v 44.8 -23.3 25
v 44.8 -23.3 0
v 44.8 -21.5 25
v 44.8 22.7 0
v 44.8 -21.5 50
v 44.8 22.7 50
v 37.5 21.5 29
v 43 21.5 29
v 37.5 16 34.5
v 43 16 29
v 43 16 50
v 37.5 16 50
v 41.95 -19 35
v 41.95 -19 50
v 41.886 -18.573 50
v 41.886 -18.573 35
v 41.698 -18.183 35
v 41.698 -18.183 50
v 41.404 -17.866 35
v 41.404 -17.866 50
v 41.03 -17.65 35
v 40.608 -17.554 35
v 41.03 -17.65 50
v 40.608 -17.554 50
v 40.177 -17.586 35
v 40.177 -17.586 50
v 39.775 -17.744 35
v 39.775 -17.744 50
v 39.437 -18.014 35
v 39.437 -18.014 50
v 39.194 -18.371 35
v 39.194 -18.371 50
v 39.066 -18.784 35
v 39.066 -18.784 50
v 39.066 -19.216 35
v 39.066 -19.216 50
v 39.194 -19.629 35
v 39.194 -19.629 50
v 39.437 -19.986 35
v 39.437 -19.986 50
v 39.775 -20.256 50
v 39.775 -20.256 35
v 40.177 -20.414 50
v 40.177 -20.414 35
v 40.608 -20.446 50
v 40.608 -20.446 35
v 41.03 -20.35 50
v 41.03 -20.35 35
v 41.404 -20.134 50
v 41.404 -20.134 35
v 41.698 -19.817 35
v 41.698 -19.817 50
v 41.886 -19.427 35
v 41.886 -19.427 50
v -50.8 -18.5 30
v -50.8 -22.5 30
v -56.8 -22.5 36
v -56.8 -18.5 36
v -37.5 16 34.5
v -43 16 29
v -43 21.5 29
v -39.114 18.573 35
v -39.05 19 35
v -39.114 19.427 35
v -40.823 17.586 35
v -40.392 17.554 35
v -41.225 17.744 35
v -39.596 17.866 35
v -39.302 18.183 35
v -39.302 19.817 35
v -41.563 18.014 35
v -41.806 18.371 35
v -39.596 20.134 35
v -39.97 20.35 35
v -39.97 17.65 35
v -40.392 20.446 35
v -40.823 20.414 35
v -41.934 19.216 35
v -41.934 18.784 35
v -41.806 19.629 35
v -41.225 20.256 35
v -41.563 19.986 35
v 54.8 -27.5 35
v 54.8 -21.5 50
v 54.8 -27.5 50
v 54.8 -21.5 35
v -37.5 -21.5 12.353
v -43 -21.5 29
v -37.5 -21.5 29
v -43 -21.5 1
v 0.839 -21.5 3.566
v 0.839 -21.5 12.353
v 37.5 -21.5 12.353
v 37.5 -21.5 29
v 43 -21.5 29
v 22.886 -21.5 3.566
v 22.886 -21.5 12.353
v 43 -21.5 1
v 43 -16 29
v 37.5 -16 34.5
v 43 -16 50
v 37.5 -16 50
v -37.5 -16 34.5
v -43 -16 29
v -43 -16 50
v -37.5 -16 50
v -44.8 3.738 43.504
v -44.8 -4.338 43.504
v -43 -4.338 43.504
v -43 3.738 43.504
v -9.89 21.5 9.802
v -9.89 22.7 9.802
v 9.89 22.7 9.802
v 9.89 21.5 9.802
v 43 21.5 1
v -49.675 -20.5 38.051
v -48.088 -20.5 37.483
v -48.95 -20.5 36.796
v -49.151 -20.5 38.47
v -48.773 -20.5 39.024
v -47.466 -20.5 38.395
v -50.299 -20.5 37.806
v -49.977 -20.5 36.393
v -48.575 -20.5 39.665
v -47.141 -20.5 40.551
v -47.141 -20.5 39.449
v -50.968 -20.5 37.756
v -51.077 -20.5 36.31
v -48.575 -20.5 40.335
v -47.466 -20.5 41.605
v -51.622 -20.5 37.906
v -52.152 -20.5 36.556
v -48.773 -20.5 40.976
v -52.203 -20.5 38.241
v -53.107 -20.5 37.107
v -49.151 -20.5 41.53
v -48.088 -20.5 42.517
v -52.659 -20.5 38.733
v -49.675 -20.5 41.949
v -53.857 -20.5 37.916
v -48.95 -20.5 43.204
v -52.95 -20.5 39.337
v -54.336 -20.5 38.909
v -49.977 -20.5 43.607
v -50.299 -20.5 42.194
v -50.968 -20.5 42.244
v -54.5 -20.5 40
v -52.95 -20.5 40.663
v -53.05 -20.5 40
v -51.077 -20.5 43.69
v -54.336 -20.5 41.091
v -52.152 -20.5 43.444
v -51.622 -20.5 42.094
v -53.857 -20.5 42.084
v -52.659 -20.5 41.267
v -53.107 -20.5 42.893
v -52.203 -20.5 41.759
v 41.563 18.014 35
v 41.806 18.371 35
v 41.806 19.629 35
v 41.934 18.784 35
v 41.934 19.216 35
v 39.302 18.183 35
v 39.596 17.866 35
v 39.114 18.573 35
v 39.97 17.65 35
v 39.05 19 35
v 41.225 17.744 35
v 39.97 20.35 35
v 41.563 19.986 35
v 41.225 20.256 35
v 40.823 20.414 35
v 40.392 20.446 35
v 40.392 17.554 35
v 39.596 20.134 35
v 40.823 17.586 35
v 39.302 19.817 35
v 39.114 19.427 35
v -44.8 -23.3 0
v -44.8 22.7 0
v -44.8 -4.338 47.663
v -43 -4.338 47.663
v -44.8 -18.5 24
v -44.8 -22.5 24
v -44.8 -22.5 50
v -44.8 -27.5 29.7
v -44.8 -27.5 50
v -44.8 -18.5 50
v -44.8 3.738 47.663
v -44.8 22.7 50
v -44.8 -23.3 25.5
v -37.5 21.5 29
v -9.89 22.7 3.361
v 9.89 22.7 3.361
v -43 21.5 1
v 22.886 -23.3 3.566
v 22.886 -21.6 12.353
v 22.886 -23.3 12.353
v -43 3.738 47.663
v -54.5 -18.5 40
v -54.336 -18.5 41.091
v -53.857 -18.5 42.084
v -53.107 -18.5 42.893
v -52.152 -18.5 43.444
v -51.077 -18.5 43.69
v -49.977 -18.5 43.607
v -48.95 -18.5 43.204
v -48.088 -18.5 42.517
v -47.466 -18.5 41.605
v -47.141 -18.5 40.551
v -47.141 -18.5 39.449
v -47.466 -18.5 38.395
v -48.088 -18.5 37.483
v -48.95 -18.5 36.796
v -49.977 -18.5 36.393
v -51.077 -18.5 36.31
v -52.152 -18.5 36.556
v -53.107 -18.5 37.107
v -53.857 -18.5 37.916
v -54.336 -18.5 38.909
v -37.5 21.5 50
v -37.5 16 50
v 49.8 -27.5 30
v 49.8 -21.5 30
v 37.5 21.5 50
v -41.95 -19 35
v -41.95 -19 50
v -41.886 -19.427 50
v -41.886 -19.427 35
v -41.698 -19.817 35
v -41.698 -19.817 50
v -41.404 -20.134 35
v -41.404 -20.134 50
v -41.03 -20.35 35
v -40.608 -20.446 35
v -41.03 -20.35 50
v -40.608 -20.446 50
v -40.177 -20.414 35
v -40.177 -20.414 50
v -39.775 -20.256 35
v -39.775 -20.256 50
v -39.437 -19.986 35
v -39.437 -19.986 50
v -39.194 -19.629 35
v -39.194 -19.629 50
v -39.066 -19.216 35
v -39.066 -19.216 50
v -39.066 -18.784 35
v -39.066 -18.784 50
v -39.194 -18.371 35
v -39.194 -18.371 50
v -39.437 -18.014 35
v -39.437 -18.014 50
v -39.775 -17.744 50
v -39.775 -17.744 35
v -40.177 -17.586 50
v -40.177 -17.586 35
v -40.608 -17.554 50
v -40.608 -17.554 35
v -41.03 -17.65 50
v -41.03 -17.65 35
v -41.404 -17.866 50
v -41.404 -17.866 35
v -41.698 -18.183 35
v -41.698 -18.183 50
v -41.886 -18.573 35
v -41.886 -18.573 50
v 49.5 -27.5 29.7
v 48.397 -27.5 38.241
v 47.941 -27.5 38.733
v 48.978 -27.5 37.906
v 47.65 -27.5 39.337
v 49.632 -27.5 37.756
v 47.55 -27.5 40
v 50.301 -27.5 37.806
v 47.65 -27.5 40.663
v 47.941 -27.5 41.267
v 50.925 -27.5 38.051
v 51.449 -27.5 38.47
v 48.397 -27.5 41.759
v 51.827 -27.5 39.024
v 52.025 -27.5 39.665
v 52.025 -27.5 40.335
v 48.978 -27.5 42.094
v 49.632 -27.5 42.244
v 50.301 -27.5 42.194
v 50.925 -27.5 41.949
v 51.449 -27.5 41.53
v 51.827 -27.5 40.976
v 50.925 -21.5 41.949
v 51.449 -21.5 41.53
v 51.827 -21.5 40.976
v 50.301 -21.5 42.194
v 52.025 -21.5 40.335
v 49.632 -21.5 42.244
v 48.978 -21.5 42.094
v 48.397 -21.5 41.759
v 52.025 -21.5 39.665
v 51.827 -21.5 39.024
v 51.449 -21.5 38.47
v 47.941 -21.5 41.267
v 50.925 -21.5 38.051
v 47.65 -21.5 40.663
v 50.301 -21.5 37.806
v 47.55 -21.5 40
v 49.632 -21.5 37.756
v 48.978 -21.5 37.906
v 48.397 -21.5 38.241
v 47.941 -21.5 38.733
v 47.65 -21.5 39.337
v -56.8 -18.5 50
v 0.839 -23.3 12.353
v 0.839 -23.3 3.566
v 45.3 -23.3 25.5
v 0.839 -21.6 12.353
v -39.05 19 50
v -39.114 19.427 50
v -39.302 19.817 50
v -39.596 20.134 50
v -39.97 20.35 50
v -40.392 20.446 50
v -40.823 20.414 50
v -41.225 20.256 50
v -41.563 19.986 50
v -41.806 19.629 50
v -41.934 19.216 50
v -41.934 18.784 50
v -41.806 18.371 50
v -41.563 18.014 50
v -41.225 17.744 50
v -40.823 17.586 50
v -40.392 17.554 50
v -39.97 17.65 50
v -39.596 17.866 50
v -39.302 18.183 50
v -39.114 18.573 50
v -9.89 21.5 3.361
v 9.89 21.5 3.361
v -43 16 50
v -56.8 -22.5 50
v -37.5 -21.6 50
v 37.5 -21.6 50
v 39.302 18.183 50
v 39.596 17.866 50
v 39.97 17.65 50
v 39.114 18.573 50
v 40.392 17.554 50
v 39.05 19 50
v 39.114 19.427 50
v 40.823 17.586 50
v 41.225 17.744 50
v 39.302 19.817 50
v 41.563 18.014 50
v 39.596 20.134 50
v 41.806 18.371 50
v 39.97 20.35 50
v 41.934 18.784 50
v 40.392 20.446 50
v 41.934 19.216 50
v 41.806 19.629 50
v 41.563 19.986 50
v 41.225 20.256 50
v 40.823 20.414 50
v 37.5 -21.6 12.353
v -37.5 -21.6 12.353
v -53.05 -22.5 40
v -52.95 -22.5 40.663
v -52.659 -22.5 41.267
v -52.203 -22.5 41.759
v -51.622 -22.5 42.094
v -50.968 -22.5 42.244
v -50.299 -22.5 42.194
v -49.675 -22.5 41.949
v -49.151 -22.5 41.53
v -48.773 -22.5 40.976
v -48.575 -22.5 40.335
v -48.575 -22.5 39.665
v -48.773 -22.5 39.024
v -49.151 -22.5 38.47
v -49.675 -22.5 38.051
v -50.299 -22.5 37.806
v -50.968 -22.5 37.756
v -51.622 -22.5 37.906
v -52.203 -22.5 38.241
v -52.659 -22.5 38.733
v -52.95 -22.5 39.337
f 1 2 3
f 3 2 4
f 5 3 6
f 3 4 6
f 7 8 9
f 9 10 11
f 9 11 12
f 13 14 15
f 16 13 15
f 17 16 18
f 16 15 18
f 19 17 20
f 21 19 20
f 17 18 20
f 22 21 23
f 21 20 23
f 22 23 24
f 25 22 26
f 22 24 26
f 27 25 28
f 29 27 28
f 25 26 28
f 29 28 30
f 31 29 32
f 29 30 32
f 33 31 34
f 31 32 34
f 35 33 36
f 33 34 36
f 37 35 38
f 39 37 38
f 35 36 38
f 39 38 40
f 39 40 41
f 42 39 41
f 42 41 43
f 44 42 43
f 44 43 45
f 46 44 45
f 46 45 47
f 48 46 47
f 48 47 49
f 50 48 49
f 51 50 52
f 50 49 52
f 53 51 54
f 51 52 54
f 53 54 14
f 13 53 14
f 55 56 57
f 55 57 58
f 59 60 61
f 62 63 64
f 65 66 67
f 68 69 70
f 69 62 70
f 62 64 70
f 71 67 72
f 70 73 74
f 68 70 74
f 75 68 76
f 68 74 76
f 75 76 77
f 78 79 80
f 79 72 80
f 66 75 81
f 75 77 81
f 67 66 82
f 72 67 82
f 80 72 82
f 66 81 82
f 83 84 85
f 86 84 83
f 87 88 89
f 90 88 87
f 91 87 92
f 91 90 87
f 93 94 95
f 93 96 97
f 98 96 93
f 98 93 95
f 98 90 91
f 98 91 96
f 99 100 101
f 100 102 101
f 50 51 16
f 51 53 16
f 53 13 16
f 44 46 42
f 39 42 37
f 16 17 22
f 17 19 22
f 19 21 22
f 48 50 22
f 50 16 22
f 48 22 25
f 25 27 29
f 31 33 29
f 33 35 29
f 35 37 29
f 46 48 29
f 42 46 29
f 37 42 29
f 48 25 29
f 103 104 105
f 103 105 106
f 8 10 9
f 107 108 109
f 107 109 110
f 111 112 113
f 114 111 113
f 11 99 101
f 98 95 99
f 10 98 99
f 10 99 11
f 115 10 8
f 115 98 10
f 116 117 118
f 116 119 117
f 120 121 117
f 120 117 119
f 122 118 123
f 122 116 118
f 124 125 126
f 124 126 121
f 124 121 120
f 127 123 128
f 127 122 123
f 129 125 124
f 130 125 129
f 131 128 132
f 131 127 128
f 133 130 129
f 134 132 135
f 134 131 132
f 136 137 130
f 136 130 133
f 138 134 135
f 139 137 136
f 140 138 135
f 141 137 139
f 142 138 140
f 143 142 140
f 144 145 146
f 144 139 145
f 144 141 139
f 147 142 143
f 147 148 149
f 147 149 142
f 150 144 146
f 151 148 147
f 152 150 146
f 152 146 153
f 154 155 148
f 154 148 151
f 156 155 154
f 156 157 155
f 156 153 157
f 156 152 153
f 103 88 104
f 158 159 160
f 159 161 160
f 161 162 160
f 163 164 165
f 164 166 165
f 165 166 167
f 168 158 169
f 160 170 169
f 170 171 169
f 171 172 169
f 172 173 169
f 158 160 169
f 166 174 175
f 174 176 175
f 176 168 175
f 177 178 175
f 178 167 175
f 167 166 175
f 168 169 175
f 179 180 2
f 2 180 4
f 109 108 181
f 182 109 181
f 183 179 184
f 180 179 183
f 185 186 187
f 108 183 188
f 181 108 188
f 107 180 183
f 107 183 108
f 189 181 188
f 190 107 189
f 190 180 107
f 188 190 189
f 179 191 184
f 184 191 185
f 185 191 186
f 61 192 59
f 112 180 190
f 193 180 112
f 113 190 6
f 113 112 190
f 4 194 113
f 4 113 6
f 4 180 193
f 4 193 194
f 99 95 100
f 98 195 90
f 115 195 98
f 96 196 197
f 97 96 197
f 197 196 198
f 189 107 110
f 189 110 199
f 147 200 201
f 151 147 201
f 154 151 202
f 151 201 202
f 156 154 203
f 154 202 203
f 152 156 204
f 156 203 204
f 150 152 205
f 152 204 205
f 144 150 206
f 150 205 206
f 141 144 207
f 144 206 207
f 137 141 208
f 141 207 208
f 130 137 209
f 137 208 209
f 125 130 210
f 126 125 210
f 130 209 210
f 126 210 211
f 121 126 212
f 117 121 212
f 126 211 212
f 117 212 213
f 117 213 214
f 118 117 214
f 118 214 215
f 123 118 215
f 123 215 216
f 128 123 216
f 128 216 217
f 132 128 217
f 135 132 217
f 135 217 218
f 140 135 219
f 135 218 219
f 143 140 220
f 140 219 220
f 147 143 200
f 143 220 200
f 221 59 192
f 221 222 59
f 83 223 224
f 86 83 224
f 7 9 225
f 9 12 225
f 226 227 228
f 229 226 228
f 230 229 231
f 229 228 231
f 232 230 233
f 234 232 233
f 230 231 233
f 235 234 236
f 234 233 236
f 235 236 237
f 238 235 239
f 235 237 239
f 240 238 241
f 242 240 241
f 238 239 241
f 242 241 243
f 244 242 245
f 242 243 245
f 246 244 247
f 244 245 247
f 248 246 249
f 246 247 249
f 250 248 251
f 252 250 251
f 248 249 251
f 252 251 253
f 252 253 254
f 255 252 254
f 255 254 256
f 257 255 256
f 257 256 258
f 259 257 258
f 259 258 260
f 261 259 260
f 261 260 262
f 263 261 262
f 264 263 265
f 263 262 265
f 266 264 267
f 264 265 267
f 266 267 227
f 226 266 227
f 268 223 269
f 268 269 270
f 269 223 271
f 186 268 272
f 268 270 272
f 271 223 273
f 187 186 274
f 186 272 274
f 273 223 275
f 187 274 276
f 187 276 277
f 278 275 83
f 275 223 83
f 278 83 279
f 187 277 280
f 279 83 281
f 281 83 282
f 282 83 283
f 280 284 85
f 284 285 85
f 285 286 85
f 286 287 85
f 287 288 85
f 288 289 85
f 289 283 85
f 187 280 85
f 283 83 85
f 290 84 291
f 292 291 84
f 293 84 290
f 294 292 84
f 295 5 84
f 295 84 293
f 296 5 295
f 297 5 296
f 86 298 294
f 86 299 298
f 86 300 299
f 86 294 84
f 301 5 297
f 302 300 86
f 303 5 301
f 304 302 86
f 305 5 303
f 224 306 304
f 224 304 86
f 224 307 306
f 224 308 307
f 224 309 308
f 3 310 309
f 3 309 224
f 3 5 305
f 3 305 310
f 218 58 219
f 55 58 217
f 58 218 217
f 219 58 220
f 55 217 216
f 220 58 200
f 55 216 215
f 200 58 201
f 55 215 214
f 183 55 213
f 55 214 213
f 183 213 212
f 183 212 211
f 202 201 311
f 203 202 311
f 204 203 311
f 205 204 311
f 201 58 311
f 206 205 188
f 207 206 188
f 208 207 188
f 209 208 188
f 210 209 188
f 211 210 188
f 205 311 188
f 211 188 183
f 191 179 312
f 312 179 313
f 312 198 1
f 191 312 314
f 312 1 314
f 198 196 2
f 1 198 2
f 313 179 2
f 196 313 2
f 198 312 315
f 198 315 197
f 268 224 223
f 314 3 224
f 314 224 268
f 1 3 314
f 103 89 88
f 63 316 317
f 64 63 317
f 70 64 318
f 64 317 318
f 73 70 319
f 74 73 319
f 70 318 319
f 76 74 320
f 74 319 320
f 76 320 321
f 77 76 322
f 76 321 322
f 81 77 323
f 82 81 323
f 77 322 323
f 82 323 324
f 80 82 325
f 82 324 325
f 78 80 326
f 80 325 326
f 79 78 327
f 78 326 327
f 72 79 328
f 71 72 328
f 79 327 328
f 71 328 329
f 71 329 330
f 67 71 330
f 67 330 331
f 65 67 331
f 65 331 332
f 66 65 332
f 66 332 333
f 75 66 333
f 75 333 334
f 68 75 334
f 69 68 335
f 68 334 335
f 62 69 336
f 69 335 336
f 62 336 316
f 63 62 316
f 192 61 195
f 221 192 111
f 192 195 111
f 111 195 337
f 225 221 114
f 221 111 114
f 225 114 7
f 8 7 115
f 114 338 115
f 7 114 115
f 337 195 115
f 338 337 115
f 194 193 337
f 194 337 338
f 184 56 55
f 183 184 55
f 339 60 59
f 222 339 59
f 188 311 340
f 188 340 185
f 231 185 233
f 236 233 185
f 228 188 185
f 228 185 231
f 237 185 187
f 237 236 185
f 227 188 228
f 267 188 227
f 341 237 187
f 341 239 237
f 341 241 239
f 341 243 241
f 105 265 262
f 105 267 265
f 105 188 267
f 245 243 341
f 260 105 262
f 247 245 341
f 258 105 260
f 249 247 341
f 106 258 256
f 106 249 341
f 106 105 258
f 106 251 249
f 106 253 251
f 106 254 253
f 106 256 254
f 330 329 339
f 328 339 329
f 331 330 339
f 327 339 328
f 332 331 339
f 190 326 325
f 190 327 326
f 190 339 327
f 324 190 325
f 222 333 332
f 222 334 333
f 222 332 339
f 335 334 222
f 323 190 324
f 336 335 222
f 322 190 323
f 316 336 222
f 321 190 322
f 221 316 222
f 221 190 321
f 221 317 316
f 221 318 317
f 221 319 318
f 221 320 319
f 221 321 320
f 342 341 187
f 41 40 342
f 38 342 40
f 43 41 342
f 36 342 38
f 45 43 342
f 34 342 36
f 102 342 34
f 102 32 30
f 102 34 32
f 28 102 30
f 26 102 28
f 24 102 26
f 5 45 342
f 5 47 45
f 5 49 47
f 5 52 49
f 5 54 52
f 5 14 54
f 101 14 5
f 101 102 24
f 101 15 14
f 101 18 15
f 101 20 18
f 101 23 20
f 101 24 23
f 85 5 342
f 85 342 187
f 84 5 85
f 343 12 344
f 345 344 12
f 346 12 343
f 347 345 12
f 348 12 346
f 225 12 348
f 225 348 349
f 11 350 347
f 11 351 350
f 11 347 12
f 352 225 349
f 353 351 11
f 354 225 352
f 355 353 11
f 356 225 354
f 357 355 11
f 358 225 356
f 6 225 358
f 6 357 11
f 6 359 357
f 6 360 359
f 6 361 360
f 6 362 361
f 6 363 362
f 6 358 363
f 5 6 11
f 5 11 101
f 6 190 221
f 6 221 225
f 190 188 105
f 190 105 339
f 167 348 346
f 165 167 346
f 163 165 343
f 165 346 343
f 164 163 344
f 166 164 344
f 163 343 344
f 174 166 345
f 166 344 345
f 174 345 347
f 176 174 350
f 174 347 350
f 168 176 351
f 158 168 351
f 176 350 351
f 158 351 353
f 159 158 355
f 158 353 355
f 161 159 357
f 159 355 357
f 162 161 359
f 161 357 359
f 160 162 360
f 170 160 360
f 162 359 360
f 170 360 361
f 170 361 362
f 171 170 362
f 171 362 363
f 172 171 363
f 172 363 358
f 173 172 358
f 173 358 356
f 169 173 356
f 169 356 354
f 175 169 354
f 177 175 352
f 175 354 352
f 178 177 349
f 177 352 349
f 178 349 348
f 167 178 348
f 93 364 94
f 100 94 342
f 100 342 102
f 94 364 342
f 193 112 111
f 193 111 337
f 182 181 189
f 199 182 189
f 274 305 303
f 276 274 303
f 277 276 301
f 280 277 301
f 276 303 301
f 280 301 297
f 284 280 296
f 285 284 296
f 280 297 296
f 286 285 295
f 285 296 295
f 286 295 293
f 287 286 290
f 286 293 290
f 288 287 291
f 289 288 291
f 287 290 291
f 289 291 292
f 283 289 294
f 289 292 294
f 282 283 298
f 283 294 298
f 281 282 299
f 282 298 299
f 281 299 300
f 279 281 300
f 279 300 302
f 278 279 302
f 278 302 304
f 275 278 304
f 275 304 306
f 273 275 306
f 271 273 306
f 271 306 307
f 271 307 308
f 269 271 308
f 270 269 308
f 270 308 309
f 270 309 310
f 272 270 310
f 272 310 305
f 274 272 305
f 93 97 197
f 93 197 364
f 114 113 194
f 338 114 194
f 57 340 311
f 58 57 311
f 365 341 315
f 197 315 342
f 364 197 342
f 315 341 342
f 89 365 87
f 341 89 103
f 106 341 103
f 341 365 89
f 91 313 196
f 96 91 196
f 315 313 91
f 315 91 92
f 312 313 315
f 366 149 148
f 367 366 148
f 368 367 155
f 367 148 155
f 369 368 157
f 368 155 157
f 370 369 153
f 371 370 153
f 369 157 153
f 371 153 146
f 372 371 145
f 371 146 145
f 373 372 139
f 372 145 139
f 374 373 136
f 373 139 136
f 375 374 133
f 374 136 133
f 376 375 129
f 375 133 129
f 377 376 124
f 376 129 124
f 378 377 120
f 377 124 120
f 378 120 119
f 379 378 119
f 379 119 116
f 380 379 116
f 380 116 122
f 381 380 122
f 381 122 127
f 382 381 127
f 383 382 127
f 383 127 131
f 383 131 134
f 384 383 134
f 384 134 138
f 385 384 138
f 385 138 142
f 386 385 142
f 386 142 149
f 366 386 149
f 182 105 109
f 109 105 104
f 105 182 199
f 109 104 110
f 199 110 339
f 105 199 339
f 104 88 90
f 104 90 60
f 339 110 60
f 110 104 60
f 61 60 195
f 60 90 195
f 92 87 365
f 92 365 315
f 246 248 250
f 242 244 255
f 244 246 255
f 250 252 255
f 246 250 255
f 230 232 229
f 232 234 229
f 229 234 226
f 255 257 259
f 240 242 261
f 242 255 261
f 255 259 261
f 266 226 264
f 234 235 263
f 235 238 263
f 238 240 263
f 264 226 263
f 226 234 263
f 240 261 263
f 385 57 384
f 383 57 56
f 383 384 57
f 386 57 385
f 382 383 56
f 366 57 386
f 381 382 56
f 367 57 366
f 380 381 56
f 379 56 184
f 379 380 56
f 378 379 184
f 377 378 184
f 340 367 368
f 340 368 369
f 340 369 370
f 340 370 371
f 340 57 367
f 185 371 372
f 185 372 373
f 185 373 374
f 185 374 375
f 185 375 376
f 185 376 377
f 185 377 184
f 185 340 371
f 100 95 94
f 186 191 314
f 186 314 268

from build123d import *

# Parameters (mm, degrees)
SKIZZE1_W                       = 89.6
SKIZZE1_H                       = 46
SKIZZE1_W_2                     = 86
SKIZZE1_H_2                     = 43
AUFSATZ_LINEAR_AUSTRAGEN1_DEPTH = 1
SKIZZE1_3_W                     = 89.6
SKIZZE1_3_H                     = 46
SKIZZE1_3_W_2                   = 86
SKIZZE1_3_H_2                   = 43
AUFSATZ_LINEAR_AUSTRAGEN2_DEPTH = 50
SKIZZE2_W                       = 5.5
SKIZZE2_H                       = 5.5
SKIZZE2_R                       = 1.45
AUFSATZ_LINEAR_AUSTRAGEN3_DEPTH = 15
SKIZZE3_W                       = 5.5
SKIZZE3_H                       = 5.5
AUFSATZ_LINEAR_AUSTRAGEN4_DEPTH = 0.5
FASE1_SIZE                      = 5.5
SKIZZE4_W                       = 4.158916141
SKIZZE4_H                       = 8.076735696
SCHNITT_LINEAR_AUSTRAGEN1_DEPTH = 10
SKIZZE5_W                       = 22.047742135
SKIZZE5_H                       = 8.787632461
SCHNITT_LINEAR_AUSTRAGEN2_DEPTH = 10
SKIZZE6_W                       = 19.779455906
SKIZZE6_H                       = 6.441932887
SCHNITT_LINEAR_AUSTRAGEN3_DEPTH = 10
SKIZZE9_W                       = 20
SKIZZE9_H                       = 6
AUFSATZ_LINEAR_AUSTRAGEN6_DEPTH = 10
SKIZZE10_R                      = 2.25
SCHNITT_LINEAR_AUSTRAGEN5_DEPTH = 10
SKIZZE11_W                      = 75
SKIZZE11_H                      = 0.1
SCHNITT_LINEAR_AUSTRAGEN6_DEPTH = 37.646803
SKIZZE12_W                      = 12
SKIZZE12_H                      = 4
AUFSATZ_LINEAR_AUSTRAGEN7_DEPTH = 20
SCHNITT_LINEAR_AUSTRAGEN7_REACH = 88.161
SKIZZE13_R                      = 2.25
SKIZZE14_R                      = 3.7
SCHNITT_LINEAR_AUSTRAGEN8_DEPTH = 2
SKIZZE15_W                      = 89.6
SKIZZE15_H                      = 4.2
AUFSATZ_LINEAR_AUSTRAGEN8_DEPTH = 20
FASE2_SIZE                      = 4.5
FASE3_SIZE                      = 5
FASE4_SIZE                      = 5
FASE5_SIZE                      = 6


# Some blends are built 0.0001 mm under size
with BuildPart() as part:
    # Skizze1 → Aufsatz-Linear austragen1 (new body)
    # profile 1 of 2: a face of its own
    with BuildSketch(Plane.XY):
        with Locations((0, -0.3)):
            Rectangle(SKIZZE1_W, SKIZZE1_H)
        Rectangle(SKIZZE1_W_2, SKIZZE1_H_2, mode=Mode.SUBTRACT)
    # profile 2 of 2: a face of its own
    with BuildSketch(Plane.XY):
        Rectangle(SKIZZE1_W_2, SKIZZE1_H_2)
    extrude(amount=AUFSATZ_LINEAR_AUSTRAGEN1_DEPTH)

    # Skizze1<3> → Aufsatz-Linear austragen2 (add)
    with BuildSketch(Plane.XY):
        with Locations((0, -0.3)):
            Rectangle(SKIZZE1_3_W, SKIZZE1_3_H)
        Rectangle(SKIZZE1_3_W_2, SKIZZE1_3_H_2, mode=Mode.SUBTRACT)
    extrude(amount=AUFSATZ_LINEAR_AUSTRAGEN2_DEPTH)

    # Skizze2 → Aufsatz-Linear austragen3 (add)
    # profile 1 of 4: a face of its own
    with BuildSketch(Plane.XY.offset(50)):
        with Locations((-40.25, 18.75)):
            Rectangle(SKIZZE2_W, SKIZZE2_H)
        with Locations((-40.5, 19)):
            Circle(SKIZZE2_R, mode=Mode.SUBTRACT)
    # profile 2 of 4: a face of its own
    with BuildSketch(Plane.XY.offset(50)):
        with Locations((-40.25, -18.75)):
            Rectangle(SKIZZE2_W, SKIZZE2_H)
        with Locations(Location((-40.5, -19, 0), (0, 0, 180))):
            Circle(SKIZZE2_R, mode=Mode.SUBTRACT)
    # profile 3 of 4: a face of its own
    with BuildSketch(Plane.XY.offset(50)):
        with Locations((40.25, -18.75)):
            Rectangle(SKIZZE2_W, SKIZZE2_H)
        with Locations((40.5, -19)):
            Circle(SKIZZE2_R, mode=Mode.SUBTRACT)
    # profile 4 of 4: a face of its own
    with BuildSketch(Plane.XY.offset(50)):
        with Locations((40.25, 18.75)):
            Rectangle(SKIZZE2_W, SKIZZE2_H)
        with Locations(Location((40.5, 19, 0), (0, 0, 180))):
            Circle(SKIZZE2_R, mode=Mode.SUBTRACT)
    extrude(amount=-AUFSATZ_LINEAR_AUSTRAGEN3_DEPTH)

    # Skizze3 → Aufsatz-Linear austragen4 (add)
    with BuildSketch(Plane(origin=(0, 0, 35), x_dir=(-1, 0, 0), z_dir=(0, 0, -1))):
        with Locations((-40.25, 18.75)):
            Rectangle(SKIZZE3_W, SKIZZE3_H)
        with Locations((-40.25, -18.75)):
            Rectangle(SKIZZE3_W, SKIZZE3_H)
        with Locations((40.25, -18.75)):
            Rectangle(SKIZZE3_W, SKIZZE3_H)
        with Locations((40.25, 18.75)):
            Rectangle(SKIZZE3_W, SKIZZE3_H)
    extrude(amount=AUFSATZ_LINEAR_AUSTRAGEN4_DEPTH)

    # Fase1
    fase1_edges = [part.edges().sort_by_distance(p)[0] for p in [
        (43, 18.75, 34.5),
        (40.25, 21.5, 34.5),
        (-40.25, -21.5, 34.5),
        (-43, -18.75, 34.5),
        (-43, 18.75, 34.5),
        (-40.25, 21.5, 34.5),
        (40.25, -21.5, 34.5),
        (43, -18.75, 34.5),
    ]]
    chamfer(fase1_edges, length=FASE1_SIZE - 0.0001)  # a hair under: the kernel refuses the full size

    # Skizze4 → Schnitt-Linear austragen1 (cut)
    with BuildSketch(Plane.ZY.offset(44.8)):
        with Locations((45.583621194, -0.3)):
            Rectangle(SKIZZE4_W, SKIZZE4_H)
    extrude(amount=-SCHNITT_LINEAR_AUSTRAGEN1_DEPTH, mode=Mode.SUBTRACT)

    # Skizze5 → Schnitt-Linear austragen2 (cut)
    with BuildSketch(Plane.XZ.offset(23.3)):
        with Locations((11.862553209, 7.95938084)):
            Rectangle(SKIZZE5_W, SKIZZE5_H)
    extrude(amount=-SCHNITT_LINEAR_AUSTRAGEN2_DEPTH, mode=Mode.SUBTRACT)

    # Skizze6 → Schnitt-Linear austragen3 (cut)
    with BuildSketch(Plane(origin=(0, 22.7, 0), x_dir=(1, 0, 0), z_dir=(0, 1, 0))):
        with Locations((0, -6.581515831)):
            Rectangle(SKIZZE6_W, SKIZZE6_H)
    extrude(amount=-SCHNITT_LINEAR_AUSTRAGEN3_DEPTH, mode=Mode.SUBTRACT)

    # Skizze9 → Aufsatz-Linear austragen6 (add)
    with BuildSketch(Plane(origin=(44.8, 0, 0), x_dir=(0, 0, -1), z_dir=(1, 0, 0))):
        with Locations((-40, -24.5)):
            Rectangle(SKIZZE9_W, SKIZZE9_H)
    extrude(amount=AUFSATZ_LINEAR_AUSTRAGEN6_DEPTH)

    # Skizze10 → Schnitt-Linear austragen5 (cut)
    with BuildSketch(Plane(origin=(0, -21.5, 0), x_dir=(1, 0, 0), z_dir=(0, 1, 0))):
        with Locations(Location((49.8, -40, 0), (0, 0, 180))):
            Circle(SKIZZE10_R)
        with Locations((-49.8, -40)):
            Circle(SKIZZE10_R)
    extrude(amount=-SCHNITT_LINEAR_AUSTRAGEN5_DEPTH, mode=Mode.SUBTRACT)

    # Skizze11 → Schnitt-Linear austragen6 (cut)
    with BuildSketch(Plane.XY.offset(50)):
        with Locations((0, -21.55)):
            Rectangle(SKIZZE11_W, SKIZZE11_H)
    extrude(amount=-SCHNITT_LINEAR_AUSTRAGEN6_DEPTH, mode=Mode.SUBTRACT)

    # Skizze12 → Aufsatz-Linear austragen7 (add)
    with BuildSketch(Plane.XY.offset(50)):
        with Locations((-50.8, -20.500000001)):
            Rectangle(SKIZZE12_W, SKIZZE12_H)
    extrude(amount=-AUFSATZ_LINEAR_AUSTRAGEN7_DEPTH)

    # Skizze13 → Schnitt-Linear austragen7 (cut, up to next)
    with BuildSketch(Plane(origin=(0, -18.500000001, 0), x_dir=(1, 0, 0), z_dir=(0, 1, 0)), mode=Mode.PRIVATE) as schnitt_linear_austragen7_sk1:
        with Locations(Location((-50.8, -40, 0), (0, 0, 180))):
            Circle(SKIZZE13_R)
    schnitt_linear_austragen7_tool1 = extrude(schnitt_linear_austragen7_sk1.sketch, amount=-SCHNITT_LINEAR_AUSTRAGEN7_REACH, mode=Mode.PRIVATE) & part.part
    add(schnitt_linear_austragen7_tool1.solids().sort_by_distance((-50.8, -18.5, 40))[0], mode=Mode.SUBTRACT)

    # Skizze14 → Schnitt-Linear austragen8 (cut)
    with BuildSketch(Plane(origin=(0, -18.500000001, 0), x_dir=(1, 0, 0), z_dir=(0, 1, 0))):
        with Locations(Location((-50.8, -40, 0), (0, 0, 180))):
            Circle(SKIZZE14_R)
    extrude(amount=-SCHNITT_LINEAR_AUSTRAGEN8_DEPTH, mode=Mode.SUBTRACT)

    # Skizze15 → Aufsatz-Linear austragen8 (add)
    with BuildSketch(Plane.XY.offset(50)):
        with Locations((0, -25.4)):
            Rectangle(SKIZZE15_W, SKIZZE15_H)
    extrude(amount=-AUFSATZ_LINEAR_AUSTRAGEN8_DEPTH)

    # Fase2
    # the kernel refuses this chamfer: 4.5 mm, written as the material it adds along each edge
    with BuildSketch(Plane(origin=(-44.8, -23.3, 30), x_dir=(0, 0.02749587661058602, -0.9996219169112969), z_dir=(1, 0, 0))) as fase2_piece_1_section:
        Polygon((FASE2_SIZE * 0.999621916911, -FASE2_SIZE * 0.0274958766106), (-FASE2_SIZE * 0.0274958766106, -FASE2_SIZE * 0.999621916911), (0, 0), align=None)
    fase2_piece_1 = extrude(amount=89.6, mode=Mode.PRIVATE)
    fase2_piece_1 = split(fase2_piece_1, bisect_by=Plane(origin=(0, -27.5, 28.499089477), z_dir=(0, 1, 0)), keep=Keep.TOP, mode=Mode.PRIVATE)
    add(fase2_piece_1)

    # Fase3
    fase3_edges = [part.edges().sort_by_distance(p)[0] for p in [
        (44.8, -24.5, 30),
    ]]
    chamfer(fase3_edges, length=FASE3_SIZE)

    # Fase4
    fase4_edges = [part.edges().sort_by_distance(p)[0] for p in [
        (54.8, -24.5, 30),
    ]]
    chamfer(fase4_edges, length=FASE4_SIZE - 0.0001)  # a hair under: the kernel refuses the full size

    # Fase5
    fase5_edges = [part.edges().sort_by_distance(p)[0] for p in [
        (-44.8, -20.500000001, 30),
    ]]
    chamfer(fase5_edges, length=FASE5_SIZE)
    fase5_2_edges = [part.edges().sort_by_distance(p)[0] for p in [
        (-56.8, -20.500000001, 30),
    ]]
    chamfer(fase5_2_edges, length=FASE5_SIZE - 0.0001)  # a hair under: the kernel refuses the full size


solid = part.part
